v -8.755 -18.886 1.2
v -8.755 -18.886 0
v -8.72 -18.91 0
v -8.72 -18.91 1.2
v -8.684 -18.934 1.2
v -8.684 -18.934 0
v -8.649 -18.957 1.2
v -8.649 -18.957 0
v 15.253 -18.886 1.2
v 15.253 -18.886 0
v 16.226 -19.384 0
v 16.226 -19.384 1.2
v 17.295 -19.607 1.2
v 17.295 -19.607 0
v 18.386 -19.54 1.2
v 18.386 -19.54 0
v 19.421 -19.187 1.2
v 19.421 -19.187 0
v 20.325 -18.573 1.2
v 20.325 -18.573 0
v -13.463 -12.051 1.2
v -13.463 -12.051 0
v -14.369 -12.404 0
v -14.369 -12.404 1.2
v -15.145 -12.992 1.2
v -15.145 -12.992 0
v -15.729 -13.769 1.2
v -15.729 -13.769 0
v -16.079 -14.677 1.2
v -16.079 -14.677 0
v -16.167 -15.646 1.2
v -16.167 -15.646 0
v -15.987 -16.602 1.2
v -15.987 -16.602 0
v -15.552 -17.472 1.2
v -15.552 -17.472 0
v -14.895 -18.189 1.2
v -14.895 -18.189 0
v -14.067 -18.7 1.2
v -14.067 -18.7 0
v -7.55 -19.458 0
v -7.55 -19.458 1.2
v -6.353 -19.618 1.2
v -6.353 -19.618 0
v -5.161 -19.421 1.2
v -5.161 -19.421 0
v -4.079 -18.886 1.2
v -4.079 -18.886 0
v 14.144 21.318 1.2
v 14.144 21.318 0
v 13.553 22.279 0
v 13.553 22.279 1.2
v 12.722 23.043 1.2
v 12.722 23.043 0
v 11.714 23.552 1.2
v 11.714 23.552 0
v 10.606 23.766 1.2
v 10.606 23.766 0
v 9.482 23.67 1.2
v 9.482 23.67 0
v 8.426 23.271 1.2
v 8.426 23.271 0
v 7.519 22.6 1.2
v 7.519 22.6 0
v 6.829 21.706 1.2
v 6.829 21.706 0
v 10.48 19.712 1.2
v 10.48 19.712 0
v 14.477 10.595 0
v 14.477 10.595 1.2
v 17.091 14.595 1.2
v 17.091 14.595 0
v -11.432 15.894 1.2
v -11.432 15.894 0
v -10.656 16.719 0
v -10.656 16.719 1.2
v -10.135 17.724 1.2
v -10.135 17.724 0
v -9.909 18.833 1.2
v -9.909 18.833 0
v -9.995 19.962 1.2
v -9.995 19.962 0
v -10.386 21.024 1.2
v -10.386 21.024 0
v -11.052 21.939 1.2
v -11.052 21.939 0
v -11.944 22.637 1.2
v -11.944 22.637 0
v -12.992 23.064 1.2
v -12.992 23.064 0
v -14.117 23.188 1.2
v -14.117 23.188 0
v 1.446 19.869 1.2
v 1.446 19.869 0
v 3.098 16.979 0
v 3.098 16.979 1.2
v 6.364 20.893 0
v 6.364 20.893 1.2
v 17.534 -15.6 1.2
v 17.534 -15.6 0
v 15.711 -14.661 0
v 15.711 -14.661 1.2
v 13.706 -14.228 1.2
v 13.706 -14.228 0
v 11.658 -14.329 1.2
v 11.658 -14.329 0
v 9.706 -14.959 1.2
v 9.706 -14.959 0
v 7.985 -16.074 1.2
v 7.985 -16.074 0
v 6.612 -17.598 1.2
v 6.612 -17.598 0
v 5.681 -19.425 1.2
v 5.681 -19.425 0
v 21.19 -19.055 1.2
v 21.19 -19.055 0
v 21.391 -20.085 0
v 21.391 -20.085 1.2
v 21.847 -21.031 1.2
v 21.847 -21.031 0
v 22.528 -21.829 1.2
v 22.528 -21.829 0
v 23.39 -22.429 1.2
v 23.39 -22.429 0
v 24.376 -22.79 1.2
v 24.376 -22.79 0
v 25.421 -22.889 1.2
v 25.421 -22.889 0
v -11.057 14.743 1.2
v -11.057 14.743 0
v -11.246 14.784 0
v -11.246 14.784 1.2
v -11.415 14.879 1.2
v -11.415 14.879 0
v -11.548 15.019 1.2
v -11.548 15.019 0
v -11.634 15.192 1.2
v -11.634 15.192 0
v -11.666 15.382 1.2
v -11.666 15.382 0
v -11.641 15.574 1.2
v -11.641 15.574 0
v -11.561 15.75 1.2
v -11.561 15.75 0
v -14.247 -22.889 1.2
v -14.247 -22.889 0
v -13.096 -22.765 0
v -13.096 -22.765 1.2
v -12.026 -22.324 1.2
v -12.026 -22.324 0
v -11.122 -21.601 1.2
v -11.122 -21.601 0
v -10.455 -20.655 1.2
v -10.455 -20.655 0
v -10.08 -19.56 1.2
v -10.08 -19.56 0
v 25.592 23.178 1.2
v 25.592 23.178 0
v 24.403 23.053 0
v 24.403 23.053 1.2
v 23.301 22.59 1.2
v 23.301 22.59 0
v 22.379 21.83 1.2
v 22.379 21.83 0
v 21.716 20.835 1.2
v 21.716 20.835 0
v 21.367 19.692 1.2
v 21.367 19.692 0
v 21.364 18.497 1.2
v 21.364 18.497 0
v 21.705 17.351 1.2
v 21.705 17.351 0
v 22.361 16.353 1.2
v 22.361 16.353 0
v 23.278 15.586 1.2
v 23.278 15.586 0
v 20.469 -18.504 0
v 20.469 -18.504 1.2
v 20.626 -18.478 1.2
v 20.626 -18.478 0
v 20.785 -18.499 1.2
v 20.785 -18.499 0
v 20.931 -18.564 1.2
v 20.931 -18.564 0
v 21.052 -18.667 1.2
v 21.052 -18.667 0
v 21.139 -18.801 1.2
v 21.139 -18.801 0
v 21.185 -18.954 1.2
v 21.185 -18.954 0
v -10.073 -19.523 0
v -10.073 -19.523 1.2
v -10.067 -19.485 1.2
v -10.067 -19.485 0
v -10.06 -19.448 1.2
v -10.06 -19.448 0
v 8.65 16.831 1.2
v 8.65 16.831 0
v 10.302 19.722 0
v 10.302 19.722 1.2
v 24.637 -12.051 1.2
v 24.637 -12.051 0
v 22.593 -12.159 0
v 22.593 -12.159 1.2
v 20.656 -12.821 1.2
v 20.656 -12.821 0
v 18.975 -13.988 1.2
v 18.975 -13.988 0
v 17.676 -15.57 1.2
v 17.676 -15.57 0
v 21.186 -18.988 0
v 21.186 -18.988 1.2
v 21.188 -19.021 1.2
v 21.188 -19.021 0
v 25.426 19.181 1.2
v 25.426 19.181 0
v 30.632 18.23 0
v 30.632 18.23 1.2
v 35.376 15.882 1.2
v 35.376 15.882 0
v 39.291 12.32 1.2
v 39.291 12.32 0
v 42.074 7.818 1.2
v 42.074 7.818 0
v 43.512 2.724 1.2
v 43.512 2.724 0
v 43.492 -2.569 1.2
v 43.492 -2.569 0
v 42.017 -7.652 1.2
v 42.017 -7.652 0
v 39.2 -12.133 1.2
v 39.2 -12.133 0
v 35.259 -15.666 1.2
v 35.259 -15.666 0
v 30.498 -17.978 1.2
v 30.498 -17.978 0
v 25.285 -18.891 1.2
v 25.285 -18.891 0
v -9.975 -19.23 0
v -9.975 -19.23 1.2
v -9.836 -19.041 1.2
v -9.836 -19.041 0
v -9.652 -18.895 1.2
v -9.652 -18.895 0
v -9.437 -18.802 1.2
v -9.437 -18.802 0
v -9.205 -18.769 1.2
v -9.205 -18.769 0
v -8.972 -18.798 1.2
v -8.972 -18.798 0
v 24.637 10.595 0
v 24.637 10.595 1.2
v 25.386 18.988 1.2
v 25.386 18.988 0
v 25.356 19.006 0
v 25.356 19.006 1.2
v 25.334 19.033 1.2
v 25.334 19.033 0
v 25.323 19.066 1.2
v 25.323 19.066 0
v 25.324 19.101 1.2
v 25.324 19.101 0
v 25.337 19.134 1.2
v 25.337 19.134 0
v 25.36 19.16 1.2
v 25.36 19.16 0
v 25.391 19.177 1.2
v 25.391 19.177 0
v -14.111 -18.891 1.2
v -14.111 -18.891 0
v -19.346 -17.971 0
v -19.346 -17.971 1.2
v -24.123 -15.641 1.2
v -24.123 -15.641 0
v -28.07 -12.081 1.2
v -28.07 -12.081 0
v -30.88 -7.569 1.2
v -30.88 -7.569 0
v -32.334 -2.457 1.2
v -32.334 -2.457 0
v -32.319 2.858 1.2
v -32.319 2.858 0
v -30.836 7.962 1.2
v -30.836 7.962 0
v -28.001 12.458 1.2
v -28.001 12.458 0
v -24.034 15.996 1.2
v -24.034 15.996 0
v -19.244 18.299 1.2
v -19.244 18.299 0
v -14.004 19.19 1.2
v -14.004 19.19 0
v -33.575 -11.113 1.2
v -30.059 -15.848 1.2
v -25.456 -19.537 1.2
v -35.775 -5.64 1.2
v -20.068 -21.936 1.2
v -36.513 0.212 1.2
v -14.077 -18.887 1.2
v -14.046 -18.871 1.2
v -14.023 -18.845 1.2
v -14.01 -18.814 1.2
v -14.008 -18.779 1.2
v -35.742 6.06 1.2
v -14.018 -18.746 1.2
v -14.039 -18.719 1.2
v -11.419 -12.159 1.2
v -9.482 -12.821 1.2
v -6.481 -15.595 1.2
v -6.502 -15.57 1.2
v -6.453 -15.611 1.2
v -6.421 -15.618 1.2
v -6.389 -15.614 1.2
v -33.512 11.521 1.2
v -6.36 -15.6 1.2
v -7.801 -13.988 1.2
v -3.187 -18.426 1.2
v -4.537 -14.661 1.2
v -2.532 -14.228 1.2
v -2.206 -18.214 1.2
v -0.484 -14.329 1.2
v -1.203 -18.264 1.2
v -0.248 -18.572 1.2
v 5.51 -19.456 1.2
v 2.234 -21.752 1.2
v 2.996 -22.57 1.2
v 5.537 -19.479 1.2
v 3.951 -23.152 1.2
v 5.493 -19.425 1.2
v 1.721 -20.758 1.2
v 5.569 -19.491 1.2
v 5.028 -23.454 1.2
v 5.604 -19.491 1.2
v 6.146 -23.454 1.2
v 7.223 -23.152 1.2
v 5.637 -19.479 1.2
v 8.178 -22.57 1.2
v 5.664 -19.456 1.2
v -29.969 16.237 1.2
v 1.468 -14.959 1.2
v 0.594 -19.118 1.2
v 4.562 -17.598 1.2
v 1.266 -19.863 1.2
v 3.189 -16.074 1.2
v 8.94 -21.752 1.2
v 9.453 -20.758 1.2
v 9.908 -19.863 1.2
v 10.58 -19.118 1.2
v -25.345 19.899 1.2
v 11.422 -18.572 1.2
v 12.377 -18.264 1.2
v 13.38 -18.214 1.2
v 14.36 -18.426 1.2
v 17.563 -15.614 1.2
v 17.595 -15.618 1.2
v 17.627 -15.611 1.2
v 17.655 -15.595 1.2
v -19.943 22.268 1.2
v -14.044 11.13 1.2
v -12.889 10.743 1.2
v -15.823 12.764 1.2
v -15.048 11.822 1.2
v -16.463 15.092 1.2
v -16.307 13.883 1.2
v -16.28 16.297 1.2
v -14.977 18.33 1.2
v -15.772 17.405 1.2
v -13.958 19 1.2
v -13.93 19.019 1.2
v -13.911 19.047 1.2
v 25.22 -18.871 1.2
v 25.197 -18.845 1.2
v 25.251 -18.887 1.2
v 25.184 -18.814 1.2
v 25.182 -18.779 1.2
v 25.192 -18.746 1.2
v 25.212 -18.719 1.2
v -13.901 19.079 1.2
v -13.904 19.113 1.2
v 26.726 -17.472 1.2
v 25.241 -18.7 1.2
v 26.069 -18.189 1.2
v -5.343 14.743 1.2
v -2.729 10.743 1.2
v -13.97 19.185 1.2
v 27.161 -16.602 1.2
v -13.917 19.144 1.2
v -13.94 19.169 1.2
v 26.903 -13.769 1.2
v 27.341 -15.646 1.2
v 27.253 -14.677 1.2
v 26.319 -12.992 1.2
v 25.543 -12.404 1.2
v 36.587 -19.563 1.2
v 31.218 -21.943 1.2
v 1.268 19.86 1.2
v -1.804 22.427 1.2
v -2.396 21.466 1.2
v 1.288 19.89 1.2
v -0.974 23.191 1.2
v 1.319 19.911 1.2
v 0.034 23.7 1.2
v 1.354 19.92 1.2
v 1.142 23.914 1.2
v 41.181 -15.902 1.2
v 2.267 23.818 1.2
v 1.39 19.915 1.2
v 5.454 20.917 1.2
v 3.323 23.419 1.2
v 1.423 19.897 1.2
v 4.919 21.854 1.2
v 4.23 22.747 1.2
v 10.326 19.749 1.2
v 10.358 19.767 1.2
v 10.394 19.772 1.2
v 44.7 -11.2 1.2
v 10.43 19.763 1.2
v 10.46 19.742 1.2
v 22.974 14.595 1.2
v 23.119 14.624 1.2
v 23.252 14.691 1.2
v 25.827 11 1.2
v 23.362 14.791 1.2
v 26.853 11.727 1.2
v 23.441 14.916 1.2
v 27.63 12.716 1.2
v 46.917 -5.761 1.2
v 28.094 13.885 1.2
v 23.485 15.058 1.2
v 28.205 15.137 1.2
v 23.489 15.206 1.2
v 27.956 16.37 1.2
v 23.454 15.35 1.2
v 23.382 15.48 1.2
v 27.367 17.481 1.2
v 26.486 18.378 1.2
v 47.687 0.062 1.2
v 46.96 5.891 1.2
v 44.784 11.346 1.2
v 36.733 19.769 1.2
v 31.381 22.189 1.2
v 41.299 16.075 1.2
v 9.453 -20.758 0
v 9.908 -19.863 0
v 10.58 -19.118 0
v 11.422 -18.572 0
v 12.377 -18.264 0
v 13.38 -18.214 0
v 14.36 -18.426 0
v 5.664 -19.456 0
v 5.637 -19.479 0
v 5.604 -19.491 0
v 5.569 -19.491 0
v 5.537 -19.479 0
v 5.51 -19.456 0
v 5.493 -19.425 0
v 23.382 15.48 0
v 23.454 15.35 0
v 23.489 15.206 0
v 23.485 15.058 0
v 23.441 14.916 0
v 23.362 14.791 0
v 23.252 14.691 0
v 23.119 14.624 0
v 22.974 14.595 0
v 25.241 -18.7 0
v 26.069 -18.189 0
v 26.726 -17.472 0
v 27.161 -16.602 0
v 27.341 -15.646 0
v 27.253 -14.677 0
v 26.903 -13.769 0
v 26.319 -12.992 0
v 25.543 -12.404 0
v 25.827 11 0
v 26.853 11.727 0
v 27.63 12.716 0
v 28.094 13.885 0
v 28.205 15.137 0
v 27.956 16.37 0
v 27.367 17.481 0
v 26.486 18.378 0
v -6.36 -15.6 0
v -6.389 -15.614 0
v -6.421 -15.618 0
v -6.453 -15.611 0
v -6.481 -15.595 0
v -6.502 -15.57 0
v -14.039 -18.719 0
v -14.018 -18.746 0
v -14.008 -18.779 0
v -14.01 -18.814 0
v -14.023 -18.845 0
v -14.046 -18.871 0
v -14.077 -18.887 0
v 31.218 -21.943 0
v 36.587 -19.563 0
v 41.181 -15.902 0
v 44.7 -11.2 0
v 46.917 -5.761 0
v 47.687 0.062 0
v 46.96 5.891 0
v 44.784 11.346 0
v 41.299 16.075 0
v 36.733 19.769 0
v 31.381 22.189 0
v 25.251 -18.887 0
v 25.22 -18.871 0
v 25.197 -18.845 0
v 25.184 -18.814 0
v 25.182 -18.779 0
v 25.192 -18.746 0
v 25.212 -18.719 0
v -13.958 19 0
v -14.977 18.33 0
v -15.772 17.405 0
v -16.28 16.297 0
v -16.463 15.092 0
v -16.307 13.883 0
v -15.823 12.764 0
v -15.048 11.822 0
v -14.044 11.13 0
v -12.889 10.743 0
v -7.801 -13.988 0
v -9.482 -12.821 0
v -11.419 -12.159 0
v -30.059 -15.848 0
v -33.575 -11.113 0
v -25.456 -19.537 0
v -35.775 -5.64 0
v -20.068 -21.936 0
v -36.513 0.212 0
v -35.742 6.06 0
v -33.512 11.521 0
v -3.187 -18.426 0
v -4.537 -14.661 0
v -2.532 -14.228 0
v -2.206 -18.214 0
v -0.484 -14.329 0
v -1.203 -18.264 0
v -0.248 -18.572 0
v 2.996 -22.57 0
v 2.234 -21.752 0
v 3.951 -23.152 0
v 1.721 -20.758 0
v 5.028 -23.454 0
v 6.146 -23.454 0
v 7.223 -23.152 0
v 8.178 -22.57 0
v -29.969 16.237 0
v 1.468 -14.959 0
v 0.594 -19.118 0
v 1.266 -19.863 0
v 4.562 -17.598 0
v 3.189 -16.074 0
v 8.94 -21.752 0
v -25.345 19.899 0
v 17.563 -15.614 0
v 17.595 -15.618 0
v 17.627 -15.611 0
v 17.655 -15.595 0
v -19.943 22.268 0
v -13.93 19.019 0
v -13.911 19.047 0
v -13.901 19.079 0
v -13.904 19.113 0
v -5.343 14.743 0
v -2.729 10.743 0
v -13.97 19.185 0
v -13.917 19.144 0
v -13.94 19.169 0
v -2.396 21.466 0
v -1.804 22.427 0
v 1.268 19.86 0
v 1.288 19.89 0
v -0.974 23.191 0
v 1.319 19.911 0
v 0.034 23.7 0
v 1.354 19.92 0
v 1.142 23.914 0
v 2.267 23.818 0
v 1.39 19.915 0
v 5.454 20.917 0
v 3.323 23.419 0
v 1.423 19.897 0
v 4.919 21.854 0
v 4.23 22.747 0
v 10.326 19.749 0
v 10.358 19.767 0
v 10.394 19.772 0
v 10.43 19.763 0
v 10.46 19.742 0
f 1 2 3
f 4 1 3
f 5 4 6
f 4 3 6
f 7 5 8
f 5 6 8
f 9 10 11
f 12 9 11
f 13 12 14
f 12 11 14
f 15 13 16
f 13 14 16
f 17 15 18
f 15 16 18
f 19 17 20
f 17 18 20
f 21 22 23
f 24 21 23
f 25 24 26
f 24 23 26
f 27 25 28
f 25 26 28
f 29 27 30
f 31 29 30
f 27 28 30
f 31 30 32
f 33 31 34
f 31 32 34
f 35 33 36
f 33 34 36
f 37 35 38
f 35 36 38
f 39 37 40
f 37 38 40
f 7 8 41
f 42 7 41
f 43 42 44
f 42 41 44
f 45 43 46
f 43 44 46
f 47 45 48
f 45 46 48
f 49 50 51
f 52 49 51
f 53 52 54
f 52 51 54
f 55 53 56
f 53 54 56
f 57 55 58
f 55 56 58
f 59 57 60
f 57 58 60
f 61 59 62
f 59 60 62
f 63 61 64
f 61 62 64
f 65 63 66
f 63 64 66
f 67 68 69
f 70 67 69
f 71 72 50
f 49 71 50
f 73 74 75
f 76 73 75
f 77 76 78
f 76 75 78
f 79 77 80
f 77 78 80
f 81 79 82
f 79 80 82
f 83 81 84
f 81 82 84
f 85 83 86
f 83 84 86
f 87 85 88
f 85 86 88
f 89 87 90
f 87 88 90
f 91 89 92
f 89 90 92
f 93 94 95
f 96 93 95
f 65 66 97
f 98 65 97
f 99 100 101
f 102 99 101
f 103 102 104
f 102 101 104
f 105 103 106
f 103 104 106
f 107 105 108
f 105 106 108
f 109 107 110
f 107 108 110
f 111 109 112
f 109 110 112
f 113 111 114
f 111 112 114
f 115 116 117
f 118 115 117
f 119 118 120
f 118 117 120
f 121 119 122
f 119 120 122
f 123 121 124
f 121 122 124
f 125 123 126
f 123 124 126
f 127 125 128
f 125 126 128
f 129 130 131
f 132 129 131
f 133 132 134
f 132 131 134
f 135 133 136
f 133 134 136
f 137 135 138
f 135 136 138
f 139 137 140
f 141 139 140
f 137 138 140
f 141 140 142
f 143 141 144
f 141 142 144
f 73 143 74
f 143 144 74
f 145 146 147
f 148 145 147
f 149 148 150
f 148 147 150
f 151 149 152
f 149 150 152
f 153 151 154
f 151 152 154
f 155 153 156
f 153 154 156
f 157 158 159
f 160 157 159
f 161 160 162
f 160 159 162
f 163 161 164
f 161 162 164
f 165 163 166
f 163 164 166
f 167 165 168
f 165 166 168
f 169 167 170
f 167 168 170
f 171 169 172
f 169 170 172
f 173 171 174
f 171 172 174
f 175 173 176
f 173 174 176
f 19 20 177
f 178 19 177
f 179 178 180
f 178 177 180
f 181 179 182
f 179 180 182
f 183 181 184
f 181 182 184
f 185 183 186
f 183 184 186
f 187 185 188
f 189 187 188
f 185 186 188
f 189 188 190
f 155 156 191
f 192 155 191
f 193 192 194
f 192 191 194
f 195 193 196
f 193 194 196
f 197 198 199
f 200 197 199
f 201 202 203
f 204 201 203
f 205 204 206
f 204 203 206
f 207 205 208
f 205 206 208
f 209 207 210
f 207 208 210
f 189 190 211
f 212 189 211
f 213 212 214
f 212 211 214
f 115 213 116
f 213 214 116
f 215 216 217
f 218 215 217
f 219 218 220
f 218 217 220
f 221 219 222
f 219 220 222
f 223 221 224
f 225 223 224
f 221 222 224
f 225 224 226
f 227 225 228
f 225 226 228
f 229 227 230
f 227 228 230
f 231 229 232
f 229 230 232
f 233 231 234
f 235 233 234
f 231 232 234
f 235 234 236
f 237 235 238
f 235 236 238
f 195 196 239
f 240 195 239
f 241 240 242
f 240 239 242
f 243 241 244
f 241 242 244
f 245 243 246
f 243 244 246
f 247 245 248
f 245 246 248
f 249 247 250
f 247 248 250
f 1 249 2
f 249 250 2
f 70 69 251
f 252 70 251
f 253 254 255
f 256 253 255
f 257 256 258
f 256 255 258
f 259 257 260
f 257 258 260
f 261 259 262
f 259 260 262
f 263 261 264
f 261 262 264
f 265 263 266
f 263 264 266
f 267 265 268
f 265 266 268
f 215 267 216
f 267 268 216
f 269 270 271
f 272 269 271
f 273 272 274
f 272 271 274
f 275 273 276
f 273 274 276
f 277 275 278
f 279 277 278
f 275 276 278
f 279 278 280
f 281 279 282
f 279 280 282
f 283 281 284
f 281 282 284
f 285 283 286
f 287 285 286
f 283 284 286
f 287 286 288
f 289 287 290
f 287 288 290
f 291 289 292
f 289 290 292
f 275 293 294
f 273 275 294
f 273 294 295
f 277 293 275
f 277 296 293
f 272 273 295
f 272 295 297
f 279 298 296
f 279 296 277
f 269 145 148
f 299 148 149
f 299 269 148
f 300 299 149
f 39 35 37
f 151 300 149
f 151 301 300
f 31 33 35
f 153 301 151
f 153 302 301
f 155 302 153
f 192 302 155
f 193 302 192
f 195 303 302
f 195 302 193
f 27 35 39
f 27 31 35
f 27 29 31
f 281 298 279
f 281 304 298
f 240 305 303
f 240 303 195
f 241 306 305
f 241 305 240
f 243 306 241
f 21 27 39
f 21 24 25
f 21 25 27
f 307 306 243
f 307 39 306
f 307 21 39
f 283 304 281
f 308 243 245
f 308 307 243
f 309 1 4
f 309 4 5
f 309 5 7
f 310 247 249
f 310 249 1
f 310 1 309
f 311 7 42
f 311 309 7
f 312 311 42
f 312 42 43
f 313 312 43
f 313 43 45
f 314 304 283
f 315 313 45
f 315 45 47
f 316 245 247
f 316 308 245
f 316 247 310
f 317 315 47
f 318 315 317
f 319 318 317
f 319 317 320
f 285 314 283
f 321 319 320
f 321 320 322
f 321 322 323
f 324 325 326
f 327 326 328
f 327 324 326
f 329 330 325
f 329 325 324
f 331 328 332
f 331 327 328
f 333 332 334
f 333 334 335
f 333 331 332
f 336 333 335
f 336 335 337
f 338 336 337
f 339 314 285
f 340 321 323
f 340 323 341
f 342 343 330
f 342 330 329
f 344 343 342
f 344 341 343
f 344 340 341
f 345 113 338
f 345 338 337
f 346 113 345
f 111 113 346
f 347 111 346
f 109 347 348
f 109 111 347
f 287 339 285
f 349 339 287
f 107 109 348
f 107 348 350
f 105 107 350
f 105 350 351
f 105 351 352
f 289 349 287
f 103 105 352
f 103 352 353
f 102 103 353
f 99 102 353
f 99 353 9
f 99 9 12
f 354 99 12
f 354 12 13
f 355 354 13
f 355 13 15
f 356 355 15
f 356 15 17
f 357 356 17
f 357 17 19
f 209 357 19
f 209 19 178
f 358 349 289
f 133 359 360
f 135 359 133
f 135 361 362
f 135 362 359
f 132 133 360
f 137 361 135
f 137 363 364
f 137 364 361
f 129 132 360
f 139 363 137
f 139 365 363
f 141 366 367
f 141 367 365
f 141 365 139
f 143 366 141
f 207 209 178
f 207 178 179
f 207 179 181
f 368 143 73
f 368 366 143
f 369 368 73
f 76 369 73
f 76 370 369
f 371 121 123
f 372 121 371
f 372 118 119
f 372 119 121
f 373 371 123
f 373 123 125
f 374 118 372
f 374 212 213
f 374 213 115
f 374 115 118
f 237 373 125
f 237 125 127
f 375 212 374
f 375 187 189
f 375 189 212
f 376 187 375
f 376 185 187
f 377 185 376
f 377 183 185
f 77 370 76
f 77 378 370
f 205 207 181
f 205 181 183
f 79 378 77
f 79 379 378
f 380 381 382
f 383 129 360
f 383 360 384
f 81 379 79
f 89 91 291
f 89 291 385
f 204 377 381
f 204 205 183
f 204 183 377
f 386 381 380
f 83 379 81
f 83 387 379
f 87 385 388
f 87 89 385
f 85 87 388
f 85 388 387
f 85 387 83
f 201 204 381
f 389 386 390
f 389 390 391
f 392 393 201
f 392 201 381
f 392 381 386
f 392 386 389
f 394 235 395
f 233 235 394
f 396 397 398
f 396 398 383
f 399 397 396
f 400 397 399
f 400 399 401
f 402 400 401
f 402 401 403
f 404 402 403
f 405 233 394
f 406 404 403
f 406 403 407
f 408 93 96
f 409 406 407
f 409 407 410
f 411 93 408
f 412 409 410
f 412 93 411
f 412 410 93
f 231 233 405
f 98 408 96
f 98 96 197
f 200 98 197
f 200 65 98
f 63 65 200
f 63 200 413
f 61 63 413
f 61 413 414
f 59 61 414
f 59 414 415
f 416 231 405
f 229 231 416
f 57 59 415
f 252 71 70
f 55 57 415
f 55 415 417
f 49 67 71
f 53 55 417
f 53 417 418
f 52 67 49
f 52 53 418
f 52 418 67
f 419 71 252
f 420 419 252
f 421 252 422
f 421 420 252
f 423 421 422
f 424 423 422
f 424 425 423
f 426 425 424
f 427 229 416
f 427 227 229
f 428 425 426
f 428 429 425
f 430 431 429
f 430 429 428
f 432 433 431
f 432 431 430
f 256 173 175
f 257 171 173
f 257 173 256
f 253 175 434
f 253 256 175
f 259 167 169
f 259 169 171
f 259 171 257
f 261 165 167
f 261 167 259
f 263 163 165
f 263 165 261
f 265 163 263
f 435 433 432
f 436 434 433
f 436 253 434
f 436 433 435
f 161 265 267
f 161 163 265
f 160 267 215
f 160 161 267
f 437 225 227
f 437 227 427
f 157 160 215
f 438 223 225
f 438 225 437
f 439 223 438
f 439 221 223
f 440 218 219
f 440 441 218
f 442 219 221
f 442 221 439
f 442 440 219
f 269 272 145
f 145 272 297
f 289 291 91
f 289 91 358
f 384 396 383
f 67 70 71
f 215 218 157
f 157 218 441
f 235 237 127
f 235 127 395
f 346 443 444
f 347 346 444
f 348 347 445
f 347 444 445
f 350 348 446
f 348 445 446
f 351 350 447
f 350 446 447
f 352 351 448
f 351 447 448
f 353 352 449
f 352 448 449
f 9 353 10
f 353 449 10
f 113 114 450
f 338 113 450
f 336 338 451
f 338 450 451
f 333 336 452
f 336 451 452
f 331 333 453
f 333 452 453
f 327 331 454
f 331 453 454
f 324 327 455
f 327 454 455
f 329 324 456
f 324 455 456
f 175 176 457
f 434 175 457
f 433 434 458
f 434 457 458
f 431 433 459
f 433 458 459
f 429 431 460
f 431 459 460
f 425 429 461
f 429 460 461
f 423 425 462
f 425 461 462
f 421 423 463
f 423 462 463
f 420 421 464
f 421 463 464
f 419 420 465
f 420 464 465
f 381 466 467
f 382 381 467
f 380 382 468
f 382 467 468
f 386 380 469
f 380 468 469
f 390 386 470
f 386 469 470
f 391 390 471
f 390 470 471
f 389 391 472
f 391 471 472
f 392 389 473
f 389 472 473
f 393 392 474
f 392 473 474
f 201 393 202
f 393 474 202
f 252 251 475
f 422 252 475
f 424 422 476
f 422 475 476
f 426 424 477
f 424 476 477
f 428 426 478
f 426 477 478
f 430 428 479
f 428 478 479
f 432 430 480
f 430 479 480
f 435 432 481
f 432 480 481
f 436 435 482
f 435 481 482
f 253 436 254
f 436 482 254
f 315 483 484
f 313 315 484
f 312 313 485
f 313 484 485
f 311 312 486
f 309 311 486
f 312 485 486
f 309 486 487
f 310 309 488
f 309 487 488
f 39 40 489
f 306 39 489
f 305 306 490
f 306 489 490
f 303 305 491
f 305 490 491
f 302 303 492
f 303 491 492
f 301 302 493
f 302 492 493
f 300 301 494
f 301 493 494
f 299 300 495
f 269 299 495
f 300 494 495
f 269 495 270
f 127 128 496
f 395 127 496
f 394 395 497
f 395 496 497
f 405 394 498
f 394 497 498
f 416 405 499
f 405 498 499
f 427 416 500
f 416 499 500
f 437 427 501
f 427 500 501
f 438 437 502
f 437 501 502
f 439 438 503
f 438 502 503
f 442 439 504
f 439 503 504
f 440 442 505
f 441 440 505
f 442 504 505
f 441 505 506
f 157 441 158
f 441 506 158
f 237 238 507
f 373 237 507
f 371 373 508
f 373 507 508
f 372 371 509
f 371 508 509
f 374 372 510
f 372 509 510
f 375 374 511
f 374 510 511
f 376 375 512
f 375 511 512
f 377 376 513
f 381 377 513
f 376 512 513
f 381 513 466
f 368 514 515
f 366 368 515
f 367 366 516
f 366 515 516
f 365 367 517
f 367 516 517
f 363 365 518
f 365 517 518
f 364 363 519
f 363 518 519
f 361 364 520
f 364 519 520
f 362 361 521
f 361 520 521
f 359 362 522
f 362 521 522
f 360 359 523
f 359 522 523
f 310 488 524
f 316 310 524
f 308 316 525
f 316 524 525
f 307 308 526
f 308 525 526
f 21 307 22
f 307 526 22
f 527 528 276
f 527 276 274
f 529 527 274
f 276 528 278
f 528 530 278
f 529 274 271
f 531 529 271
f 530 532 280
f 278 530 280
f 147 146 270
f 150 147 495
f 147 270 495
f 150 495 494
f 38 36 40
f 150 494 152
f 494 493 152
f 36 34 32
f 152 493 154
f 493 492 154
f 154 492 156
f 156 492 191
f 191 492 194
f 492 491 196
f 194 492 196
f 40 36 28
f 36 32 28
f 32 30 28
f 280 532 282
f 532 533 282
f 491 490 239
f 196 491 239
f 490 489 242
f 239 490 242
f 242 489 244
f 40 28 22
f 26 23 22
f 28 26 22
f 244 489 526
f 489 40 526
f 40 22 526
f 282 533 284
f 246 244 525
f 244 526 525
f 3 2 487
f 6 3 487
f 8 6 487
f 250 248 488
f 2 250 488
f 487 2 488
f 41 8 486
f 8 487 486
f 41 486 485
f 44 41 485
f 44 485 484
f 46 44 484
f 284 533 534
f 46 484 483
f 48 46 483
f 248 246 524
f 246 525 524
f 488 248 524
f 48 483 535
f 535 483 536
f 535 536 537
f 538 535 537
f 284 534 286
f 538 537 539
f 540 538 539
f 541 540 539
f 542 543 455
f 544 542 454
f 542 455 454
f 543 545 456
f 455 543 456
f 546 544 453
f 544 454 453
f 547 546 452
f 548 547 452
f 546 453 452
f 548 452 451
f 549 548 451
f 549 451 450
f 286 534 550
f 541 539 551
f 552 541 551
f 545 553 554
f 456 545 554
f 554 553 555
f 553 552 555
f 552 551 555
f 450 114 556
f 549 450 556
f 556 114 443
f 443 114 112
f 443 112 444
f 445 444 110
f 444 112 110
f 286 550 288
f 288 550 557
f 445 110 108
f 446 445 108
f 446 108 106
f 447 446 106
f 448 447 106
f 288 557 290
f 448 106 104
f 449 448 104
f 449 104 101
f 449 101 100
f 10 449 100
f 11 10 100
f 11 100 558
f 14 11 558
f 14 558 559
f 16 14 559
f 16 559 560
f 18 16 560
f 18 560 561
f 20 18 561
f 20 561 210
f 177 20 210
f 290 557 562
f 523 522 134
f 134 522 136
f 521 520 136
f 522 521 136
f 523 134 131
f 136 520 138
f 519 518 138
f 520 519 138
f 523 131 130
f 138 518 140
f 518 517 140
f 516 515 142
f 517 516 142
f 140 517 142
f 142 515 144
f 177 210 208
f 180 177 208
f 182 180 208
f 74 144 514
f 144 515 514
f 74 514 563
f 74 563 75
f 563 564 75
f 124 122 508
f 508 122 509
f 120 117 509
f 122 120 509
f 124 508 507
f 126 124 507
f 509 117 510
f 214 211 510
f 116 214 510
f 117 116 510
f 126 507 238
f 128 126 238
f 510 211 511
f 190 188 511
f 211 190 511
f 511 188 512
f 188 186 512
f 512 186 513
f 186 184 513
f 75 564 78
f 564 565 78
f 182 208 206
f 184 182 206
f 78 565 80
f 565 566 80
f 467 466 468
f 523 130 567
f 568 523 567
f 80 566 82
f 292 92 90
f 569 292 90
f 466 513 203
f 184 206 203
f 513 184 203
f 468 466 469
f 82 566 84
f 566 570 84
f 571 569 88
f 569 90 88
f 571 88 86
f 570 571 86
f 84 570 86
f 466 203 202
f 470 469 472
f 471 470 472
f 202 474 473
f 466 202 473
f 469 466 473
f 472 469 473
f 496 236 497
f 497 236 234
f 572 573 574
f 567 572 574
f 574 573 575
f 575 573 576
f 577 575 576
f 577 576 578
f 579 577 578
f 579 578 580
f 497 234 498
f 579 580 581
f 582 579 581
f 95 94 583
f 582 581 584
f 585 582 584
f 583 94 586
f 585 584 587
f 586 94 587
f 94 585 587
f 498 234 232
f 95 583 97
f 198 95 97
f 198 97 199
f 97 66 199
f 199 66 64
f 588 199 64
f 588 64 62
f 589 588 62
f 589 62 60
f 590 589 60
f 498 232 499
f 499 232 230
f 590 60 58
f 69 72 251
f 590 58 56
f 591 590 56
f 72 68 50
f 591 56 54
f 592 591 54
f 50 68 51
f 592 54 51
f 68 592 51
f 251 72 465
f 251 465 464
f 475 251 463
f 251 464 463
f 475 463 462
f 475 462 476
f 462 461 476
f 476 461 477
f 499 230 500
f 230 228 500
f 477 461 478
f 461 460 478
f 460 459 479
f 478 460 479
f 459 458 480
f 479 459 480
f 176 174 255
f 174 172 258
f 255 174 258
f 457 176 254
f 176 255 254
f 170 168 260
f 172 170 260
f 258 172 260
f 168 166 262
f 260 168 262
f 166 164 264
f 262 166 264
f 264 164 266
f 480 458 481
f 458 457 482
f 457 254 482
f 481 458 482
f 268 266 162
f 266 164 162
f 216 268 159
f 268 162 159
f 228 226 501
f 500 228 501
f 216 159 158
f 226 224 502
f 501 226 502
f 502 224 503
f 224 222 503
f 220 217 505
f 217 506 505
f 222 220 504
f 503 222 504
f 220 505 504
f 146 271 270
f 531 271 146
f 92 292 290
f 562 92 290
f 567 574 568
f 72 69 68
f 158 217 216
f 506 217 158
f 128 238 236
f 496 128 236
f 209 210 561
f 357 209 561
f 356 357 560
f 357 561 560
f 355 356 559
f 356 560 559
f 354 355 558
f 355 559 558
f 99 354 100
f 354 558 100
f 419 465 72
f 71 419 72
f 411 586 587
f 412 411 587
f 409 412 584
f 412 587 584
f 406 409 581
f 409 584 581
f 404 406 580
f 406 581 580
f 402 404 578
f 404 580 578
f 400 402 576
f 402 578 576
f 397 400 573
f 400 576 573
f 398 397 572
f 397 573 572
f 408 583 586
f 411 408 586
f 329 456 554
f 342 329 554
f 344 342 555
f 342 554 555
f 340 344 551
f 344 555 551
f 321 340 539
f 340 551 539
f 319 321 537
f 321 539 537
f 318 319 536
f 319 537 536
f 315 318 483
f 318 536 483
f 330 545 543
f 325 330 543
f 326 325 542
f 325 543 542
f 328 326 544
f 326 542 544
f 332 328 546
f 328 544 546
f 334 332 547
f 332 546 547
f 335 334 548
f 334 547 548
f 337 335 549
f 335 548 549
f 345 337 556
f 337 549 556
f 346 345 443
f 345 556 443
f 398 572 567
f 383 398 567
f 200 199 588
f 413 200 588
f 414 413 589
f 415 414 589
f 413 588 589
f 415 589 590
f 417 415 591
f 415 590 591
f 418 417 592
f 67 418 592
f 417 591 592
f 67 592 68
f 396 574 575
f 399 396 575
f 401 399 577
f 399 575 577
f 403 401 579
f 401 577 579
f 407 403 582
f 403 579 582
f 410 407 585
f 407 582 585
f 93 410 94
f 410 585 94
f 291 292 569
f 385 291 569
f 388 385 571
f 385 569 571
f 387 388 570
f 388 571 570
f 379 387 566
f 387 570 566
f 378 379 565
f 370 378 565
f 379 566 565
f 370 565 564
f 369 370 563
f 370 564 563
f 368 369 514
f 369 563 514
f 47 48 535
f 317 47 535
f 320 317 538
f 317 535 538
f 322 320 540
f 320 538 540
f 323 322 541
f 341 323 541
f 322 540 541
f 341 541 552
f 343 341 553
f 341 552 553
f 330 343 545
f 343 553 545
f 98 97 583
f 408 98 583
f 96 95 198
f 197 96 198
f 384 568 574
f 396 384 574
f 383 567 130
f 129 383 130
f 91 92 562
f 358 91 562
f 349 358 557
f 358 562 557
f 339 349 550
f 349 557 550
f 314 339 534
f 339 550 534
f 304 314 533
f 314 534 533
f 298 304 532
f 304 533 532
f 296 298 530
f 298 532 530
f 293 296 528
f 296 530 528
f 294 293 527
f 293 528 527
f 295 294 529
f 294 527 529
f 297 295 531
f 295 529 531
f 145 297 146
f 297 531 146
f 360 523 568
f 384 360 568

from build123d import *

# Parameters (mm, degrees)
F1_DEPTH = 1.2


with BuildPart() as f1:
    # F0 (on Top) → F1 (new body)
    with BuildSketch(Plane.XY):
        with BuildLine():
            ThreePointArc((-11.057271, 14.742629), (-11.634473, 15.191614), (-11.432224, 15.894354))
            ThreePointArc((-11.432224, 15.894354), (-10.153228, 20.506336), (-14.117182, 23.188365))
            ThreePointArc((-14.117182, 23.188365), (-36.512956, 0.2125), (-14.246818, -22.88902))
            ThreePointArc((-14.246818, -22.88902), (-11.548187, -21.994576), (-10.080089, -19.559965))
            ThreePointArc((-10.080089, -19.559965), (-10.072004, -19.503727), (-10.060345, -19.448119))
            ThreePointArc((-10.060345, -19.448119), (-9.547743, -18.841405), (-8.754742, -18.886272))
            ThreePointArc((-8.754742, -18.886272), (-8.700528, -18.919907), (-8.648865, -18.957342))
            ThreePointArc((-8.648865, -18.957342), (-6.352939, -19.617532), (-4.078768, -18.885911))
            ThreePointArc((-4.078768, -18.885911), (-0.715713, -18.386761), (1.721045, -20.75773))
            ThreePointArc((1.721045, -20.75773), (5.586952, -23.492169), (9.452858, -20.75773))
            ThreePointArc((9.452858, -20.75773), (11.889616, -18.386761), (15.252671, -18.885911))
            ThreePointArc((15.252671, -18.885911), (17.843085, -19.610271), (20.324967, -18.573352))
            ThreePointArc((20.324967, -18.573352), (20.860199, -18.525989), (21.184551, -18.954373))
            ThreePointArc((21.184551, -18.954373), (21.18943, -19.004364), (21.189767, -19.054592))
            ThreePointArc((21.189767, -19.054592), (22.528031, -21.829393), (25.420721, -22.88902))
            ThreePointArc((25.420721, -22.88902), (47.686792, 0.062182), (25.591536, 23.177874))
            ThreePointArc((25.591536, 23.177874), (21.499758, 20.276401), (23.278403, 15.586239))
            ThreePointArc((23.278403, 15.586239), (23.467753, 14.985609), (22.973846, 14.594884))
            ThreePointArc((22.973846, 14.594884), (22.937343, 14.593682), (22.90084, 14.594884))
            Line((22.90084, 14.594884), (17.09098, 14.594884))
            Line((17.09098, 14.594884), (14.143941, 21.317934))
            ThreePointArc((14.143941, 21.317934), (10.606114, 23.766142), (6.829072, 21.706071))
            Line((6.829072, 21.706071), (6.364495, 20.893062))
            Line((6.364495, 20.893062), (5.454447, 20.917279))
            Line((5.454447, 20.917279), (4.919283, 21.853817))
            ThreePointArc((4.919283, 21.853817), (1.142241, 23.913887), (-2.395586, 21.465679))
            Line((-2.395586, 21.465679), (-5.342625, 14.742629))
            Line((-5.342625, 14.742629), (-10.971048, 14.742629))
            ThreePointArc((-10.971048, 14.742629), (-11.01416, 14.741203), (-11.057271, 14.742629))
        make_face()
        with BuildLine():
            ThreePointArc((-14.110806, -18.891334), (-32.512973, 0.201246), (-14.003666, 19.189977))
            ThreePointArc((-14.003666, 19.189977), (-13.903576, 19.113297), (-13.958097, 18.999607))
            ThreePointArc((-13.958097, 18.999607), (-16.427445, 14.482007), (-12.888596, 10.74263))
            Line((-12.888596, 10.74263), (-2.728596, 10.74263))
            Line((-2.728596, 10.74263), (1.2679, 19.859795))
            ThreePointArc((1.2679, 19.859795), (1.354189, 19.919508), (1.446312, 19.869262))
            Line((1.446312, 19.869262), (3.098136, 16.978568))
            Line((3.098136, 16.978568), (8.650219, 16.830822))
            Line((8.650219, 16.830822), (10.302044, 19.721517))
            ThreePointArc((10.302044, 19.721517), (10.394167, 19.771763), (10.480455, 19.71205))
            Line((10.480455, 19.71205), (14.476952, 10.594885))
            Line((14.476952, 10.594885), (24.636952, 10.594885))
            ThreePointArc((24.636952, 10.594885), (28.19471, 14.507176), (25.386326, 18.987873))
            ThreePointArc((25.386326, 18.987873), (25.323767, 19.101427), (25.425881, 19.181307))
            ThreePointArc((25.425881, 19.181307), (43.686821, 0.077013), (25.284709, -18.891334))
            ThreePointArc((25.284709, -18.891334), (25.183808, -18.813608), (25.241076, -18.699842))
            ThreePointArc((25.241076, -18.699842), (27.330713, -15.158302), (24.636952, -12.051417))
            ThreePointArc((24.636952, -12.051417), (20.65623, -12.820988), (17.676245, -15.570182))
            ThreePointArc((17.676245, -15.570182), (17.611536, -15.615886), (17.533888, -15.600178))
            ThreePointArc((17.533888, -15.600178), (10.661063, -14.580103), (5.681242, -19.425476))
            ThreePointArc((5.681242, -19.425476), (5.586952, -19.49217), (5.492661, -19.425476))
            ThreePointArc((5.492661, -19.425476), (0.51284, -14.580103), (-6.359985, -15.600178))
            ThreePointArc((-6.359985, -15.600178), (-6.437633, -15.615886), (-6.502342, -15.570182))
            ThreePointArc((-6.502342, -15.570182), (-9.482327, -12.820988), (-13.463048, -12.051417))
            ThreePointArc((-13.463048, -12.051417), (-16.15681, -15.158302), (-14.067173, -18.699842))
            ThreePointArc((-14.067173, -18.699842), (-14.009905, -18.813608), (-14.110806, -18.891334))
        make_face(mode=Mode.SUBTRACT)
        with BuildLine():
            Line((-10.971048, 14.742629), (-11.057271, 14.742629))
            ThreePointArc((-11.057271, 14.742629), (-11.01416, 14.741203), (-10.971048, 14.742629))
        make_face()
        with BuildLine():
            ThreePointArc((-10.060345, -19.448119), (-10.072004, -19.503727), (-10.080089, -19.559965))
            ThreePointArc((-10.080089, -19.559965), (-10.06983, -19.50411), (-10.060345, -19.448119))
        make_face()
        with BuildLine():
            ThreePointArc((-8.648865, -18.957342), (-8.700528, -18.919907), (-8.754742, -18.886272))
            ThreePointArc((-8.754742, -18.886272), (-8.702079, -18.922219), (-8.648865, -18.957342))
        make_face()
        with BuildLine():
            Line((22.973846, 14.594884), (22.90084, 14.594884))
            ThreePointArc((22.90084, 14.594884), (22.937343, 14.593682), (22.973846, 14.594884))
        make_face()
        with BuildLine():
            ThreePointArc((21.189767, -19.054592), (21.18943, -19.004364), (21.184551, -18.954373))
            ThreePointArc((21.184551, -18.954373), (21.186852, -19.004498), (21.189767, -19.054592))
        make_face()
    extrude(amount=F1_DEPTH)


solid = f1.part
